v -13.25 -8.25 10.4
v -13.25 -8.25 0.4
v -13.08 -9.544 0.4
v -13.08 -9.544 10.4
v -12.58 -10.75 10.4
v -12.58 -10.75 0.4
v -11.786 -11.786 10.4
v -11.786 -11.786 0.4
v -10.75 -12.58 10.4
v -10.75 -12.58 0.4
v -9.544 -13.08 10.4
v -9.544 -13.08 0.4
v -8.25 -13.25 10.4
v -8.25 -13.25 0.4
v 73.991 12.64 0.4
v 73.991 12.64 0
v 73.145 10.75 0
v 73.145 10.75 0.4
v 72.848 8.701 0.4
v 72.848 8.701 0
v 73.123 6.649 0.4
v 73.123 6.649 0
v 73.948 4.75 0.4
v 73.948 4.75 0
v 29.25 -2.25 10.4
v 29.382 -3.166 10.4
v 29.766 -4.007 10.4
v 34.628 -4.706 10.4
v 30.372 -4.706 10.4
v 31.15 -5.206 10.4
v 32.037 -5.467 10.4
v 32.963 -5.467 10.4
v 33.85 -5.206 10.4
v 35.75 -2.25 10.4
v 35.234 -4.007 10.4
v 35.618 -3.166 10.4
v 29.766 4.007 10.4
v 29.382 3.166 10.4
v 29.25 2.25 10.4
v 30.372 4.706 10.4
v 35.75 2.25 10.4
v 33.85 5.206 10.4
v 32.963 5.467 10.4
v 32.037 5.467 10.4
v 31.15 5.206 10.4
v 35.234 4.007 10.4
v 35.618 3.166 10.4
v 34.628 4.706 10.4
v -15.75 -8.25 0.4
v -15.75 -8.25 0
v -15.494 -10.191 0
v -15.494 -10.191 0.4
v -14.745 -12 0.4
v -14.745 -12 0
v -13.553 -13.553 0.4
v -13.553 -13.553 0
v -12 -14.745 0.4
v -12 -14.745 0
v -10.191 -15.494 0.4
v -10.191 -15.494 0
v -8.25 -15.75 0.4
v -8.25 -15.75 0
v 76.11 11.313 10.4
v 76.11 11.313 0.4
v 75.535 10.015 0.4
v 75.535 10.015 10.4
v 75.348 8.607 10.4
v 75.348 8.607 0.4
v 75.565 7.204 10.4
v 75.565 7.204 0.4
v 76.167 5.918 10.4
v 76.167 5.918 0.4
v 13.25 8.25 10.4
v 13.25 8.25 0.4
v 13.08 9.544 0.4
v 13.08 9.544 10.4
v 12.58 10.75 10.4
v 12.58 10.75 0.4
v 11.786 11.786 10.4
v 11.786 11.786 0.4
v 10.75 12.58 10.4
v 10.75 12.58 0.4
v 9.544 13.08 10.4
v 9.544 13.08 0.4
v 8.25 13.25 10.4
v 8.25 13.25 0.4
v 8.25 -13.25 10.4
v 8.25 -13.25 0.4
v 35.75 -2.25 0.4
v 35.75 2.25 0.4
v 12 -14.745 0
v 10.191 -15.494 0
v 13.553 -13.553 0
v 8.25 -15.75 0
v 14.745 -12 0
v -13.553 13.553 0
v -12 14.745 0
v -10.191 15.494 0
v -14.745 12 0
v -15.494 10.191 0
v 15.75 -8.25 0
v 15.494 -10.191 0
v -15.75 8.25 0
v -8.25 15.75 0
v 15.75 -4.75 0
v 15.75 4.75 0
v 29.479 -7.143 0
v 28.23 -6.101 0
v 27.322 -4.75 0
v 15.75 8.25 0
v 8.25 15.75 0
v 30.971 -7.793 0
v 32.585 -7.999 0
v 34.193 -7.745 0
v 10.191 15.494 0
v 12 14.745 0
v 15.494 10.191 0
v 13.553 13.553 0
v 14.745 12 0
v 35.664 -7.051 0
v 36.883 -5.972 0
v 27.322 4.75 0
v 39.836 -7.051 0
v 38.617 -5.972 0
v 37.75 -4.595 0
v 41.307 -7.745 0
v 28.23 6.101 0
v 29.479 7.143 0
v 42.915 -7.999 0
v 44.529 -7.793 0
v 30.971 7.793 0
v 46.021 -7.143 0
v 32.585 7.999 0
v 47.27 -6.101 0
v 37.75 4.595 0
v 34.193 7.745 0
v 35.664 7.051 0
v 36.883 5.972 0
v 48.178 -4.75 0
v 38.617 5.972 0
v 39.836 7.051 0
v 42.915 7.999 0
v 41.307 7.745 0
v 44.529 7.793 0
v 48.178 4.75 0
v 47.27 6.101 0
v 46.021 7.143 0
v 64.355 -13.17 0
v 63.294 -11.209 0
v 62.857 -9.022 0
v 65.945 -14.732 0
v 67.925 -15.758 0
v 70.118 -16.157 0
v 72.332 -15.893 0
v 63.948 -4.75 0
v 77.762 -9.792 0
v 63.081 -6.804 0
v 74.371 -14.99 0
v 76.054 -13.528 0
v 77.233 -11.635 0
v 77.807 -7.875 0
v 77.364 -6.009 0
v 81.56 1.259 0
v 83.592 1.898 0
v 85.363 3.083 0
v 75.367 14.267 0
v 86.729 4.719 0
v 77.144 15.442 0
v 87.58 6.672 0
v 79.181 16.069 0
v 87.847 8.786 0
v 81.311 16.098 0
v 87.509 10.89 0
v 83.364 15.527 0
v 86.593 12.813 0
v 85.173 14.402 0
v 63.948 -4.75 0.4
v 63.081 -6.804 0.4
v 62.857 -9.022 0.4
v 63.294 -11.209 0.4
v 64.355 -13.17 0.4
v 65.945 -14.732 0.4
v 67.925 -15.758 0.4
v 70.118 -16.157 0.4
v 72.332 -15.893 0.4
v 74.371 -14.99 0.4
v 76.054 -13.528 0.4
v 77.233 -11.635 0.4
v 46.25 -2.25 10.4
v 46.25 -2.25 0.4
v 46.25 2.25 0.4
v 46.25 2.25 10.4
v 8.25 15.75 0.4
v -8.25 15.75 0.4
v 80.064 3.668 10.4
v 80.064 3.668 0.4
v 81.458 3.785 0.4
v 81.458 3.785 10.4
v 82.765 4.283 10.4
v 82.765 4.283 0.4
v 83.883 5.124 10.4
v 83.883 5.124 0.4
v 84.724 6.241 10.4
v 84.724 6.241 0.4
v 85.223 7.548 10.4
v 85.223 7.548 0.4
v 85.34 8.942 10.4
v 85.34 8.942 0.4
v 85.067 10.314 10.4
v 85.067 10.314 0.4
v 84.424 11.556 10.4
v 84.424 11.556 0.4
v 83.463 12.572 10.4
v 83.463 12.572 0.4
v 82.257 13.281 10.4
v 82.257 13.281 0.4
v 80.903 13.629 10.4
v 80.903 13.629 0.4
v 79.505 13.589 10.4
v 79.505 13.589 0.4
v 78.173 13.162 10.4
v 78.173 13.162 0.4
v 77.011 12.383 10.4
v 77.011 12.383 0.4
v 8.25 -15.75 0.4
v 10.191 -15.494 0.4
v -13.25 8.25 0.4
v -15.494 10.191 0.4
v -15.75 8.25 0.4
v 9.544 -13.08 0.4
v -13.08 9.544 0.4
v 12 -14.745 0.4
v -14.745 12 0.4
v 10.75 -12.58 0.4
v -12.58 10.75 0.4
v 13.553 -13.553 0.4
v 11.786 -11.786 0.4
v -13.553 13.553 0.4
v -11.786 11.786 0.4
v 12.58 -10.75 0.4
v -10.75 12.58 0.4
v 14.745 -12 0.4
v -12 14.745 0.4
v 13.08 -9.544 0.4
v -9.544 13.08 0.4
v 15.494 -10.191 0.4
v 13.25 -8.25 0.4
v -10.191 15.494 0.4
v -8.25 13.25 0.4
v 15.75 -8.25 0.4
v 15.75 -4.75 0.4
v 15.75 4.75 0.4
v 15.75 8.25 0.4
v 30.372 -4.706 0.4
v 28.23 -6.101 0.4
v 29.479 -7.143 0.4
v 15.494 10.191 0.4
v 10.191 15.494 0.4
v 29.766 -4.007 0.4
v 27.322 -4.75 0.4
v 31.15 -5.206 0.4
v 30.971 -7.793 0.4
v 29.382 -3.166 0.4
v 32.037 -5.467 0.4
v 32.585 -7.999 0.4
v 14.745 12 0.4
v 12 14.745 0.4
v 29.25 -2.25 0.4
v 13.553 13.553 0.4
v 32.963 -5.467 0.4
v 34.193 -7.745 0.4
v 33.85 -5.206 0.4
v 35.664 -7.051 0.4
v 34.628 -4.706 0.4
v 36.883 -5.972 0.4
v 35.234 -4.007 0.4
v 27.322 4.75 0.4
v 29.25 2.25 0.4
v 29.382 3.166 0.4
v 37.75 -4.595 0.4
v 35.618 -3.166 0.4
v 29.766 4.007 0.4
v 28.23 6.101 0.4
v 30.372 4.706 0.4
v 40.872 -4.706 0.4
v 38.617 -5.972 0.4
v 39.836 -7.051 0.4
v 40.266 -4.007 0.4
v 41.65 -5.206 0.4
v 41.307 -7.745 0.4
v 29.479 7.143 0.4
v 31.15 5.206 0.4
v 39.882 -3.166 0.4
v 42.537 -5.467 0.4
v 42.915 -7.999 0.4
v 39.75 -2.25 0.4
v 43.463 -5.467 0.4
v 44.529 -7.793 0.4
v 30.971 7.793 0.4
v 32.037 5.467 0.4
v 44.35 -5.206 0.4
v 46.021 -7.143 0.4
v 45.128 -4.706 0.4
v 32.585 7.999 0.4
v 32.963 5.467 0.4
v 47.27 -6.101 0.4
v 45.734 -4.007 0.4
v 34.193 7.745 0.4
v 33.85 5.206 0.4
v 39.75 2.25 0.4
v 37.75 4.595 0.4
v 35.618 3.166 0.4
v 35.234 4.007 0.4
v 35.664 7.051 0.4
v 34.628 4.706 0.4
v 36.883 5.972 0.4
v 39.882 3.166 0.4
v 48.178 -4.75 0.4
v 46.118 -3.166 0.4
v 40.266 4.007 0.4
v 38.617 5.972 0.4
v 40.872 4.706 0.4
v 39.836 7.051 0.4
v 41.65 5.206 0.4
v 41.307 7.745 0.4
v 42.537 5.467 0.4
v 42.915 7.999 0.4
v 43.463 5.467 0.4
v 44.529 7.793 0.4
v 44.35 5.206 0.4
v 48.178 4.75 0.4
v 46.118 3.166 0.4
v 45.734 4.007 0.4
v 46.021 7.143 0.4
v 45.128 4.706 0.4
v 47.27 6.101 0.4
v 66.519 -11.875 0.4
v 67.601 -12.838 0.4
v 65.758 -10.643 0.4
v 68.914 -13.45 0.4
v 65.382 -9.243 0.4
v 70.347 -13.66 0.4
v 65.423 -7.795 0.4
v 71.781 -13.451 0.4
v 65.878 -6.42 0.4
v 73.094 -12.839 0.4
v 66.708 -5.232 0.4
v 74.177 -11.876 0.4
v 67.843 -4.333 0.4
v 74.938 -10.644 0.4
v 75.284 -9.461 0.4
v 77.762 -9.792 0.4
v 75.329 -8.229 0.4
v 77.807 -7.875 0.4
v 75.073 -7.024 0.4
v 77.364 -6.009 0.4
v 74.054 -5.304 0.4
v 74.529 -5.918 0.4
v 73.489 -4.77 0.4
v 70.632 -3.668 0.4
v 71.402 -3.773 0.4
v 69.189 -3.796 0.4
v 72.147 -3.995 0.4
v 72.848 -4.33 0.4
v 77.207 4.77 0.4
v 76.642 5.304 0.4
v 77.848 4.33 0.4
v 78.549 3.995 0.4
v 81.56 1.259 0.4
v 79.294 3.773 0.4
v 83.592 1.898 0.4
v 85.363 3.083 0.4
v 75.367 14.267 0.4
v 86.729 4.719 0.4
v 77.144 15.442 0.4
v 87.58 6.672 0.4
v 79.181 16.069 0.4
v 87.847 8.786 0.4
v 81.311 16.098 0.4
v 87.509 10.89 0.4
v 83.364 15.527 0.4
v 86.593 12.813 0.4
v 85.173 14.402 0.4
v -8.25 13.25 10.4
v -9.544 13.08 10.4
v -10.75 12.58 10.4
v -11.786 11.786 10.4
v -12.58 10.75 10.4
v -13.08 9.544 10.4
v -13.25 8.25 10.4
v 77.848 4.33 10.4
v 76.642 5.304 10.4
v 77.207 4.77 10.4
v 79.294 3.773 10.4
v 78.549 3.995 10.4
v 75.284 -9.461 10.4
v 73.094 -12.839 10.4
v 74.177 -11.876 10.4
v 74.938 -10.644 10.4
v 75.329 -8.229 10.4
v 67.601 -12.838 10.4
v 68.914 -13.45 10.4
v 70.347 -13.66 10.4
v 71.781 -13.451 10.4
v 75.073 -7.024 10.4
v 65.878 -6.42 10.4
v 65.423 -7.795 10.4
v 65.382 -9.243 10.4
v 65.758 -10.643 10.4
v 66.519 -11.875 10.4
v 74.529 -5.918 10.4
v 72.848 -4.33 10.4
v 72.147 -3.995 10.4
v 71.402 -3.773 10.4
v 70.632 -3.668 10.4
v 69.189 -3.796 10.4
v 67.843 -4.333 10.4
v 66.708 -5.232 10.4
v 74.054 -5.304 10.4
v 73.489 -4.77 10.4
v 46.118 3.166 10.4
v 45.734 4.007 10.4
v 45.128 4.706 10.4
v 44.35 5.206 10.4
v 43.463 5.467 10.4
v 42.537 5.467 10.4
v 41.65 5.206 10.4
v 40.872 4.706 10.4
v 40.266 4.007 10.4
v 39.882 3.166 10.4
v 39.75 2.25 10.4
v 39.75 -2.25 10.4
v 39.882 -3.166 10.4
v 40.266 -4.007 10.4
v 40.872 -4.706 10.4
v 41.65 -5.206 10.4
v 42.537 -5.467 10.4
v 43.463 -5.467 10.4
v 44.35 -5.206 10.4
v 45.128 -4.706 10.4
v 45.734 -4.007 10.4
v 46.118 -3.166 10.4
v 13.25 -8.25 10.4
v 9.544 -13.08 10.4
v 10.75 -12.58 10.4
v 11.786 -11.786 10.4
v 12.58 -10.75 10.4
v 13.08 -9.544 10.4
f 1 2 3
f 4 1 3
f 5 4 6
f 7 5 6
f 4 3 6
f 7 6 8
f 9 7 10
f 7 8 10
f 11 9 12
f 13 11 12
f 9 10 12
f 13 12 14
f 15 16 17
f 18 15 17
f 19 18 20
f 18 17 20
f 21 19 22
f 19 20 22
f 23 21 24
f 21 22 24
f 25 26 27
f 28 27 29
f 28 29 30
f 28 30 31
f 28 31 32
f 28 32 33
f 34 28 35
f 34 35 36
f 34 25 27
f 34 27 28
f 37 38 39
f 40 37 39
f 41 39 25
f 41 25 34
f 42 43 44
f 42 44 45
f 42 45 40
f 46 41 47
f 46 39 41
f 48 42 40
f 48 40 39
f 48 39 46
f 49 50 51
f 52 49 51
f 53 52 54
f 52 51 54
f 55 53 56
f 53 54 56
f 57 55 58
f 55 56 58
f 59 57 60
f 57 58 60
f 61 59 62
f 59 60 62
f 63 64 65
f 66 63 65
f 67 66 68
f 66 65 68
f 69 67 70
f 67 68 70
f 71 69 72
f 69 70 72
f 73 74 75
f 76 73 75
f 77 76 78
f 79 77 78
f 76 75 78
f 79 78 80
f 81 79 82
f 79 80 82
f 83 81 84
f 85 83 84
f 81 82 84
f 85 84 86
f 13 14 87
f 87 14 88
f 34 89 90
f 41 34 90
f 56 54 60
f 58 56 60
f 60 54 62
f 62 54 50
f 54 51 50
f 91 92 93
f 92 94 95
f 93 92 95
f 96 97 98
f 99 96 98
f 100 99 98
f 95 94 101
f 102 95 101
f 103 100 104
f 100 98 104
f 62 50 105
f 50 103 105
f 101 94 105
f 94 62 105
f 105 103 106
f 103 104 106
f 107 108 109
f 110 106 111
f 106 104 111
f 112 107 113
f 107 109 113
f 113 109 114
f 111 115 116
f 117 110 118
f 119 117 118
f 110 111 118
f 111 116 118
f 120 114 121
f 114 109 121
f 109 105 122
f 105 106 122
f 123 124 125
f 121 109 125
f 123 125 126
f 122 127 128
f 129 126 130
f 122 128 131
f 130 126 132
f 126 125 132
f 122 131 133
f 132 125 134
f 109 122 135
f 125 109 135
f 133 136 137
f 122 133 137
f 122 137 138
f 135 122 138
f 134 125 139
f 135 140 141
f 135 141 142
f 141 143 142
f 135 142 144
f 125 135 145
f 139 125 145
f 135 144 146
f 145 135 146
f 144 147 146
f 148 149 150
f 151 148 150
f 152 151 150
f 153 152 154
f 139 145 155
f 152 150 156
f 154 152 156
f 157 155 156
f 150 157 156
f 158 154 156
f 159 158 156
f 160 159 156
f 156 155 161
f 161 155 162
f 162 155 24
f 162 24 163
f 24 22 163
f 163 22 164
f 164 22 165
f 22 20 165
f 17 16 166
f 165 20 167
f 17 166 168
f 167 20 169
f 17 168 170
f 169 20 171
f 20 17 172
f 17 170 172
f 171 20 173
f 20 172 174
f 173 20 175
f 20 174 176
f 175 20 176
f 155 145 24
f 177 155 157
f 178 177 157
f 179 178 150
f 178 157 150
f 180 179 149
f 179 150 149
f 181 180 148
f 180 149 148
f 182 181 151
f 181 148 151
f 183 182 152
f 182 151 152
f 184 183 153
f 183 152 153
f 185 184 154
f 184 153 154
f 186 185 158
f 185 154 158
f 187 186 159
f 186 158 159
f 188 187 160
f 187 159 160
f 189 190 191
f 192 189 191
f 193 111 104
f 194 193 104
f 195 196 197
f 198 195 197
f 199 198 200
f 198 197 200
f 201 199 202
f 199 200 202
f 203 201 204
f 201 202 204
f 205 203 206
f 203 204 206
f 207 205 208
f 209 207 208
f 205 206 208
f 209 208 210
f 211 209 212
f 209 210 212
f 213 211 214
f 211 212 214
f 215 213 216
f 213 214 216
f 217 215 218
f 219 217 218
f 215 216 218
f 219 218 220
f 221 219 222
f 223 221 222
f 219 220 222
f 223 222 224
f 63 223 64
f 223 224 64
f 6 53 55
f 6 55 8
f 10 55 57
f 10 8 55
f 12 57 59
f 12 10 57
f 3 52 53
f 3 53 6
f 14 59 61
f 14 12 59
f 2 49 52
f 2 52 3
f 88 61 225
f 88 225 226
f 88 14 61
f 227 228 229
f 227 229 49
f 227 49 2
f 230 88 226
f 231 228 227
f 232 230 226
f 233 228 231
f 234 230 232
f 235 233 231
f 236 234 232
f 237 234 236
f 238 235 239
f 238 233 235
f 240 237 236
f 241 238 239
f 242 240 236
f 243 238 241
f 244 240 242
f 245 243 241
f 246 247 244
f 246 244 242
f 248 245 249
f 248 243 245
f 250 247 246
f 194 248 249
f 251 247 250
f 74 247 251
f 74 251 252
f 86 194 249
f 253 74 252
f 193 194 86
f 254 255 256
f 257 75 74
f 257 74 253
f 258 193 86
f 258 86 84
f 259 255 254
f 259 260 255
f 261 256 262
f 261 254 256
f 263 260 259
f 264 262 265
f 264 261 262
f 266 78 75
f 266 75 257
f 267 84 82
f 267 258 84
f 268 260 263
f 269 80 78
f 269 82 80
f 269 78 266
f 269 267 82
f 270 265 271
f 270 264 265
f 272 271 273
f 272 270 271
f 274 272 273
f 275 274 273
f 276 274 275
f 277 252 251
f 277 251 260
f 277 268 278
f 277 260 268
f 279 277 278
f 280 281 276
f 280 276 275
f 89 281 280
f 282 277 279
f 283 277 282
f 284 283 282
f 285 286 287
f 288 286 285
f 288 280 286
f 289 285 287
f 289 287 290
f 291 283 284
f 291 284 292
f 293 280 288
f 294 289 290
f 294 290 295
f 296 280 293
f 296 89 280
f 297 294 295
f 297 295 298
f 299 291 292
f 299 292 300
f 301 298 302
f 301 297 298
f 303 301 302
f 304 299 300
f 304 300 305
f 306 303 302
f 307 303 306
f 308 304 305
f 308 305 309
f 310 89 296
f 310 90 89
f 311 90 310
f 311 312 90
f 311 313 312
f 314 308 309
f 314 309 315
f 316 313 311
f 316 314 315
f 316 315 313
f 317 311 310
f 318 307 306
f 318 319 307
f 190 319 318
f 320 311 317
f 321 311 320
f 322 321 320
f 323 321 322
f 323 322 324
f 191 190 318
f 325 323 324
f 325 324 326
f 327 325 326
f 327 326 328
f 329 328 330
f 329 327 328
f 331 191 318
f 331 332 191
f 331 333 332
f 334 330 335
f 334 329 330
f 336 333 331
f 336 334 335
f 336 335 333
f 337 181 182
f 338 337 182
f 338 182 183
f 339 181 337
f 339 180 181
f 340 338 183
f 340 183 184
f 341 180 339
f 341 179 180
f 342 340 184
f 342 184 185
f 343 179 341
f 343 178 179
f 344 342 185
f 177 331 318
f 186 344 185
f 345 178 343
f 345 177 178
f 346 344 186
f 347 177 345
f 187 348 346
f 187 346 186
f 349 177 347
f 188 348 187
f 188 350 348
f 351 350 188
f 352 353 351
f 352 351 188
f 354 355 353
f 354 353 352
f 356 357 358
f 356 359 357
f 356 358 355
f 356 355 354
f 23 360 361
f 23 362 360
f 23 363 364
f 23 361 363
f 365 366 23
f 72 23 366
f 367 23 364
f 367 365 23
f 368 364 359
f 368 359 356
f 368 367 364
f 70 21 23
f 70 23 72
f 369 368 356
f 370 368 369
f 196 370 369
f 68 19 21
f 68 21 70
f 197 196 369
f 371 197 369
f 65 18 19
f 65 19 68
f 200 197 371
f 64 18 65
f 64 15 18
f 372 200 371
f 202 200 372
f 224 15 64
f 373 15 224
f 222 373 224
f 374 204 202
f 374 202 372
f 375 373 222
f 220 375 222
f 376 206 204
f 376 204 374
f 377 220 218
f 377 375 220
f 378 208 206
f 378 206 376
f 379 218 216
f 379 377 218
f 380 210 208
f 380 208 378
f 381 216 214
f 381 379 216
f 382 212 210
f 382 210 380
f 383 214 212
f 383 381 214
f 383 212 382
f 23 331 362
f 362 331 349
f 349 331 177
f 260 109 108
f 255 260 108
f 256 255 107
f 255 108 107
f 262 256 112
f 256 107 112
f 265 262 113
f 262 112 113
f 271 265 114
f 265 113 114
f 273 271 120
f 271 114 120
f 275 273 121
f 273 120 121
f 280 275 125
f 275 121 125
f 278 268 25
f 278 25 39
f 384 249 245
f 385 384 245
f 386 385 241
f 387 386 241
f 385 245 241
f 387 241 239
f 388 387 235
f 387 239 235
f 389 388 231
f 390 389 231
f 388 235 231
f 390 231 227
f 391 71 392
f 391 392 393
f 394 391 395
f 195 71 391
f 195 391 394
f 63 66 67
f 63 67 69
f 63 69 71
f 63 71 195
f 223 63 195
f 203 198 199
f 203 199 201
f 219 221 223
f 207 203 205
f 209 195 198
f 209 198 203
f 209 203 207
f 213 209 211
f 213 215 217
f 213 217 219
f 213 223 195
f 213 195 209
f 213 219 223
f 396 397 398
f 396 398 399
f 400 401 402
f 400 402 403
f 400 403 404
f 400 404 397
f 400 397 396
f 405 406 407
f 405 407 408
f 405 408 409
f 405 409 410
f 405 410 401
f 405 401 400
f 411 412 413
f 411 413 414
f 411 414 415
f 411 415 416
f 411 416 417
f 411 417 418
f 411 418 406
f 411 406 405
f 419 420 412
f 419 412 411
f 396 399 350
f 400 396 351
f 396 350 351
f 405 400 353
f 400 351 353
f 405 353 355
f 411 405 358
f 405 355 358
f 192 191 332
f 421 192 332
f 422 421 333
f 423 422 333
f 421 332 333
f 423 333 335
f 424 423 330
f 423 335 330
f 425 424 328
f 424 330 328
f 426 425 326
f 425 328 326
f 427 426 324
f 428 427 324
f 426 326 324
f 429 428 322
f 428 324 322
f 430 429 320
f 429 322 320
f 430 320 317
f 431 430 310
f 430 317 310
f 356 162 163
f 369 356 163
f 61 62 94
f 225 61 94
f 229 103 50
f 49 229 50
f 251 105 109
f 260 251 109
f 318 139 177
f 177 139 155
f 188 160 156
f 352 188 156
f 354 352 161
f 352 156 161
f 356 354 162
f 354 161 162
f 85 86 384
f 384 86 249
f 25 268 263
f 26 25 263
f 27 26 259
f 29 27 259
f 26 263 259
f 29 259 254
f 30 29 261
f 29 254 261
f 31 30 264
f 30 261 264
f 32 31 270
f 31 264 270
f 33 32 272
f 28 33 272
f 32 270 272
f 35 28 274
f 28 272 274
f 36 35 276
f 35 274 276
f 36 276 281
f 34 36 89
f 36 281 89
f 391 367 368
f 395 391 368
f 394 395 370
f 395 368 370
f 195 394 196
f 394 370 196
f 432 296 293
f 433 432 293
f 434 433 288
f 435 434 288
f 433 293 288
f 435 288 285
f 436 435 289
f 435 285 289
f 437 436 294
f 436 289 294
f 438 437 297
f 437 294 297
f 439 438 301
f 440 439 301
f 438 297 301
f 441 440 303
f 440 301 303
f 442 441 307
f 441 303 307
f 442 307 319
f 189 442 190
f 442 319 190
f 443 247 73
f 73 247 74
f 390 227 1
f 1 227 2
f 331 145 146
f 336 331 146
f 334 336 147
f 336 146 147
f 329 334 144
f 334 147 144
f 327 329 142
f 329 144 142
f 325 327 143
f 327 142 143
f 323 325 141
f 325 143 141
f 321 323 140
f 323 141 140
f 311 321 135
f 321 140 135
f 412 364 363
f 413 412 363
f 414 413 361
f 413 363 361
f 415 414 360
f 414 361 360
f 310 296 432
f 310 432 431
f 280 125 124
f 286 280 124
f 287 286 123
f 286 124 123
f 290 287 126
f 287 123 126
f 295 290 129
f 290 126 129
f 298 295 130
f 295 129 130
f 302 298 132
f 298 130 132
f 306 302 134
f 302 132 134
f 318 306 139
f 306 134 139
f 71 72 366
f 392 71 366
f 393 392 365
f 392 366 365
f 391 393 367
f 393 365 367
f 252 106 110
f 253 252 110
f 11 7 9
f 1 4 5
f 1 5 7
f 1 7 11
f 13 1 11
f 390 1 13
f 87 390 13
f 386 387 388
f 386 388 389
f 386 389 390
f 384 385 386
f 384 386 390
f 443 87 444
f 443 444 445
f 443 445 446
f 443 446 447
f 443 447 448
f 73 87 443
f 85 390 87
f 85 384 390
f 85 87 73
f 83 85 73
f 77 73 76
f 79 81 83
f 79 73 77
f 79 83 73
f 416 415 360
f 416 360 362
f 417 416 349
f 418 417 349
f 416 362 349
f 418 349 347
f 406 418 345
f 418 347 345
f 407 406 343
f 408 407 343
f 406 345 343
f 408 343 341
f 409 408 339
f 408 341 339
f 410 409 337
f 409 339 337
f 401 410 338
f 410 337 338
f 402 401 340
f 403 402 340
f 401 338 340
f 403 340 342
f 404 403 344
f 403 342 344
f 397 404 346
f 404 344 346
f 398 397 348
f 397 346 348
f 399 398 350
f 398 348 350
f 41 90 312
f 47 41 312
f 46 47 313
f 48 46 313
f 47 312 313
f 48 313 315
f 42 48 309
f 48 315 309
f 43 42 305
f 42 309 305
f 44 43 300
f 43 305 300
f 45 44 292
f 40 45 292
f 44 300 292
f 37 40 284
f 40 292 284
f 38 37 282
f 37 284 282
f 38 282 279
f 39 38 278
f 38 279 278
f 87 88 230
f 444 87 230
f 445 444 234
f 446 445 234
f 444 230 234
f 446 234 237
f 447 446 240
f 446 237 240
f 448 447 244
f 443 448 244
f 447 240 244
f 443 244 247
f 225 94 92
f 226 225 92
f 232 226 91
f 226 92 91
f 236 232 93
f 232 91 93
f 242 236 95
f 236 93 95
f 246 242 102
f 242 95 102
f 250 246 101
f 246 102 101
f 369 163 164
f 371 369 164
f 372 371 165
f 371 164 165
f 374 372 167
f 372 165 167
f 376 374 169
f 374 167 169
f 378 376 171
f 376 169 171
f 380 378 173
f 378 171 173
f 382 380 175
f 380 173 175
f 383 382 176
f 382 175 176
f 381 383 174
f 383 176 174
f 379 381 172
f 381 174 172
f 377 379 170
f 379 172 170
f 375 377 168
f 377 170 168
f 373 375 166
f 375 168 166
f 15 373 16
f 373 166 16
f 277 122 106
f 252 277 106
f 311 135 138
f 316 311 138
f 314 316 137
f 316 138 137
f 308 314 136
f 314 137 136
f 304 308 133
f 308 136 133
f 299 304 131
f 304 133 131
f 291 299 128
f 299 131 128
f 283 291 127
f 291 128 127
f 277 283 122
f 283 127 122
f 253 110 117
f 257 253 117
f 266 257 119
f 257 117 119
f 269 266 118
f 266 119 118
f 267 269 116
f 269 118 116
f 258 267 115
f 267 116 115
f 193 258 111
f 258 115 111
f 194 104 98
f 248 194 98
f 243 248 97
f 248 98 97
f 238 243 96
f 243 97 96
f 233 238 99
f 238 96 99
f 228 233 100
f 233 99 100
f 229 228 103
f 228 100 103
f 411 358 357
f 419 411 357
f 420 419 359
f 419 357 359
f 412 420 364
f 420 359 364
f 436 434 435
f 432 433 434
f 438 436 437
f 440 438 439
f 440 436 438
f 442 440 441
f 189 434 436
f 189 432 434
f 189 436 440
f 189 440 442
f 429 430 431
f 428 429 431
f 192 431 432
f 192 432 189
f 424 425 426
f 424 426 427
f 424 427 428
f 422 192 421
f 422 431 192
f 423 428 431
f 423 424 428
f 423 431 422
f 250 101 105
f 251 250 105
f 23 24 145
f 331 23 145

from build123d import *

# Parameters (mm, degrees)
F0_W     = 16
F0_H     = 4.5
F0_W_2   = 6.5
F0_W_3   = 4
F1_DEPTH = 0.4
F2_W     = 6.5
F2_H     = 4.5
F3_DEPTH = 10


with BuildPart() as f1:
    # F0 (on Top) → F1 (new body)
    with BuildSketch(Plane.XY):
        with BuildLine():
            Line((15.75, 4.75), (15.75, 8.25))
            ThreePointArc((15.75, 8.25), (13.5533008589, 13.5533008589), (8.25, 15.75))
            Line((8.25, 15.75), (-8.25, 15.75))
            ThreePointArc((-8.25, 15.75), (-13.5533008589, 13.5533008589), (-15.75, 8.25))
            Line((-15.75, 8.25), (-15.75, -8.25))
            ThreePointArc((-15.75, -8.25), (-13.5533008589, -13.5533008589), (-8.25, -15.75))
            Line((-8.25, -15.75), (8.25, -15.75))
            ThreePointArc((8.25, -15.75), (13.5533008589, -13.5533008589), (15.75, -8.25))
            Line((15.75, -8.25), (15.75, -4.75))
            Line((15.75, -4.75), (27.3219212057, -4.75))
            ThreePointArc((27.3219212057, -4.75), (32.5853423404, -7.9993666334), (37.75, -4.5952078799))
            ThreePointArc((37.75, -4.5952078799), (42.9146576596, -7.9993666334), (48.1780787943, -4.75))
            Line((48.1780787943, -4.75), (63.9480829801, -4.75))
            ThreePointArc((63.9480829801, -4.75), (66.8968372515, -15.3190038936), (77.2327151222, -11.6354426145))
            ThreePointArc((77.2327151222, -11.6354426145), (77.8460434738, -8.8348591092), (77.3637435709, -6.0087617221))
            Line((77.3637435709, -6.0087617221), (81.5596501878, 1.2587617221))
            ThreePointArc((81.5596501878, 1.2587617221), (86.5931791372, 12.813408194), (73.9909516796, 12.6398228195))
            ThreePointArc((73.9909516796, 12.6398228195), (72.8481869165, 8.7010040658), (73.9480829801, 4.75))
            Line((73.9480829801, 4.75), (48.1780787943, 4.75))
            ThreePointArc((48.1780787943, 4.75), (42.9146576596, 7.9993666334), (37.75, 4.5952078799))
            ThreePointArc((37.75, 4.5952078799), (32.5853423404, 7.9993666334), (27.3219212057, 4.75))
            Line((27.3219212057, 4.75), (15.75, 4.75))
        make_face()
        with BuildLine():
            ThreePointArc((13.25, -8.25), (11.7855339059, -11.7855339059), (8.25, -13.25))
            Line((8.25, -13.25), (4.5, -13.25))
            Line((4.5, -13.25), (-4.5, -13.25))
            Line((-4.5, -13.25), (-8.25, -13.25))
            ThreePointArc((-8.25, -13.25), (-11.7855339059, -11.7855339059), (-13.25, -8.25))
            Line((-13.25, -8.25), (-13.25, -4.5))
            Line((-13.25, -4.5), (-13.25, 4.5))
            Line((-13.25, 4.5), (-13.25, 8.25))
            ThreePointArc((-13.25, 8.25), (-11.7855339059, 11.7855339059), (-8.25, 13.25))
            Line((-8.25, 13.25), (-4.5, 13.25))
            Line((-4.5, 13.25), (4.5, 13.25))
            Line((4.5, 13.25), (8.25, 13.25))
            ThreePointArc((8.25, 13.25), (11.7855339059, 11.7855339059), (13.25, 8.25))
            Line((13.25, 8.25), (13.25, 4.5))
            Line((13.25, 4.5), (13.25, 2.25))
            Line((13.25, 2.25), (29.25, 2.25))
            ThreePointArc((29.25, 2.25), (32.5, 5.5), (35.75, 2.25))
            Line((35.75, 2.25), (39.75, 2.25))
            ThreePointArc((39.75, 2.25), (43, 5.5), (46.25, 2.25))
            Line((46.25, 2.25), (74.0490381057, 2.25))
            Line((74.0490381057, 2.25), (76.1669476654, 5.9183269633))
            ThreePointArc((76.1669476654, 5.9183269633), (75.3483548112, 8.6074722144), (76.1099931902, 11.3132998923))
            ThreePointArc((76.1099931902, 11.3132998923), (84.7892183681, 10.9572643434), (80.0640619824, 3.6683269633))
            Line((80.0640619824, 3.6683269633), (74.5292047573, -5.9183269633))
            ThreePointArc((74.5292047573, -5.9183269633), (75.3294853289, -8.2294835611), (74.9378354853, -10.643713089))
            ThreePointArc((74.9378354853, -10.643713089), (66.0933823399, -11.2865784771), (70.6320904403, -3.6683269633))
            Line((70.6320904403, -3.6683269633), (71.4509618943, -2.25))
            Line((71.4509618943, -2.25), (46.25, -2.25))
            ThreePointArc((46.25, -2.25), (43, -5.5), (39.75, -2.25))
            Line((39.75, -2.25), (35.75, -2.25))
            ThreePointArc((35.75, -2.25), (32.5, -5.5), (29.25, -2.25))
            Line((29.25, -2.25), (13.25, -2.25))
            Line((13.25, -2.25), (13.25, -4.5))
            Line((13.25, -4.5), (13.25, -8.25))
        make_face(mode=Mode.SUBTRACT)
        Polygon((46.25, 2.25), (46.25, -2.25), (71.4509618943, -2.25), (74.0490381057, 2.25), align=None)
        Polygon((-4.5, 4.5), (0, 4.5), (4.5, 4.5), (4.5, 13.25), (-4.5, 13.25), align=None)
        Polygon((-13.25, -4.5), (-4.5, -4.5), (-4.5, 0), (-4.5, 4.5), (-13.25, 4.5), align=None)
        Polygon((4.5, 0), (4.5, -4.5), (13.25, -4.5), (13.25, -2.25), (13.25, 2.25), (13.25, 4.5), (4.5, 4.5), align=None)
        Polygon((-4.5, -13.25), (4.5, -13.25), (4.5, -4.5), (0, -4.5), (-4.5, -4.5), align=None)
        with BuildLine():
            ThreePointArc((74.5292047573, -5.9183269633), (72.8480762114, -4.3301270189), (70.6320904403, -3.6683269633))
            ThreePointArc((70.6320904403, -3.6683269633), (66.0933823399, -11.2865784771), (74.9378354853, -10.643713089))
            ThreePointArc((74.9378354853, -10.643713089), (75.3294853289, -8.2294835611), (74.5292047573, -5.9183269633))
        make_face()
        with BuildLine():
            ThreePointArc((76.1099931902, 11.3132998923), (75.3483548112, 8.6074722144), (76.1669476654, 5.9183269633))
            ThreePointArc((76.1669476654, 5.9183269633), (77.8480762114, 4.3301270189), (80.0640619824, 3.6683269633))
            ThreePointArc((80.0640619824, 3.6683269633), (84.7892183681, 10.9572643434), (76.1099931902, 11.3132998923))
        make_face()
        with Locations((21.25, 0)):
            Rectangle(F0_W, F0_H)
        with BuildLine():
            Line((4.5, 13.25), (4.5, 4.5))
            Line((4.5, 4.5), (13.25, 4.5))
            Line((13.25, 4.5), (13.25, 8.25))
            ThreePointArc((13.25, 8.25), (11.7855339059, 11.7855339059), (8.25, 13.25))
            Line((8.25, 13.25), (4.5, 13.25))
        make_face()
        with BuildLine():
            Line((-13.25, 4.5), (-4.5, 4.5))
            Line((-4.5, 4.5), (-4.5, 13.25))
            Line((-4.5, 13.25), (-8.25, 13.25))
            ThreePointArc((-8.25, 13.25), (-11.7855339059, 11.7855339059), (-13.25, 8.25))
            Line((-13.25, 8.25), (-13.25, 4.5))
        make_face()
        with BuildLine():
            Line((4.5, -13.25), (8.25, -13.25))
            ThreePointArc((8.25, -13.25), (11.7855339059, -11.7855339059), (13.25, -8.25))
            Line((13.25, -8.25), (13.25, -4.5))
            Line((13.25, -4.5), (4.5, -4.5))
            Line((4.5, -4.5), (4.5, -13.25))
        make_face()
        with BuildLine():
            Line((-8.25, -13.25), (-4.5, -13.25))
            Line((-4.5, -13.25), (-4.5, -4.5))
            Line((-4.5, -4.5), (-13.25, -4.5))
            Line((-13.25, -4.5), (-13.25, -8.25))
            ThreePointArc((-13.25, -8.25), (-11.7855339059, -11.7855339059), (-8.25, -13.25))
        make_face()
        with BuildLine():
            ThreePointArc((0, -4.5), (3.1819805153, -3.1819805153), (4.5, 0))
            ThreePointArc((4.5, 0), (3.1819805153, 3.1819805153), (0, 4.5))
            ThreePointArc((0, 4.5), (-3.1819805153, 3.1819805153), (-4.5, 0))
            ThreePointArc((-4.5, 0), (-3.1819805153, -3.1819805153), (0, -4.5))
        make_face()
        with BuildLine():
            Line((74.0490381057, 2.25), (71.4509618943, -2.25))
            Line((71.4509618943, -2.25), (70.6320904403, -3.6683269633))
            ThreePointArc((70.6320904403, -3.6683269633), (72.8480762114, -4.3301270189), (74.5292047573, -5.9183269633))
            Line((74.5292047573, -5.9183269633), (80.0640619824, 3.6683269633))
            ThreePointArc((80.0640619824, 3.6683269633), (77.8480762114, 4.3301270189), (76.1669476654, 5.9183269633))
            Line((76.1669476654, 5.9183269633), (74.0490381057, 2.25))
        make_face()
        with Locations((32.5, 0)):
            Rectangle(F0_W_2, F0_H)
        with Locations((43, 0)):
            Rectangle(F0_W_2, F0_H)
        with Locations((37.75, 0)):
            Rectangle(F0_W_3, F0_H)
        with BuildLine():
            Line((35.75, -2.25), (29.25, -2.25))
            ThreePointArc((29.25, -2.25), (32.5, -5.5), (35.75, -2.25))
        make_face()
        with BuildLine():
            ThreePointArc((35.75, 2.25), (32.5, 5.5), (29.25, 2.25))
            Line((29.25, 2.25), (35.75, 2.25))
        make_face()
        with BuildLine():
            Line((46.25, -2.25), (39.75, -2.25))
            ThreePointArc((39.75, -2.25), (43, -5.5), (46.25, -2.25))
        make_face()
        with BuildLine():
            ThreePointArc((46.25, 2.25), (43, 5.5), (39.75, 2.25))
            Line((39.75, 2.25), (46.25, 2.25))
        make_face()
        with BuildLine():
            Line((0, -4.5), (4.5, -4.5))
            Line((4.5, -4.5), (4.5, 0))
            ThreePointArc((4.5, 0), (3.1819805153, -3.1819805153), (0, -4.5))
        make_face()
        with BuildLine():
            Line((-4.5, 4.5), (-4.5, 0))
            ThreePointArc((-4.5, 0), (-3.1819805153, 3.1819805153), (0, 4.5))
            Line((0, 4.5), (-4.5, 4.5))
        make_face()
        with BuildLine():
            Line((-4.5, 0), (-4.5, -4.5))
            Line((-4.5, -4.5), (0, -4.5))
            ThreePointArc((0, -4.5), (-3.1819805153, -3.1819805153), (-4.5, 0))
        make_face()
        with BuildLine():
            ThreePointArc((0, 4.5), (3.1819805153, 3.1819805153), (4.5, 0))
            Line((4.5, 0), (4.5, 4.5))
            Line((4.5, 4.5), (0, 4.5))
        make_face()
    extrude(amount=F1_DEPTH)

    # F2 (on face) → F3 (join)
    with BuildSketch(Plane.XY.offset(0.4)):
        Polygon((-4.5, -13.25), (4.5, -13.25), (4.5, -4.5), (0, -4.5), (-4.5, -4.5), align=None)
        with BuildLine():
            Line((35.75, -2.25), (29.25, -2.25))
            ThreePointArc((29.25, -2.25), (32.5, -5.5), (35.75, -2.25))
        make_face()
        with BuildLine():
            ThreePointArc((35.75, 2.25), (32.5, 5.5), (29.25, 2.25))
            Line((29.25, 2.25), (35.75, 2.25))
        make_face()
        with Locations((32.5, 0)):
            Rectangle(F2_W, F2_H)
        with BuildLine():
            ThreePointArc((46.25, 2.25), (43, 5.5), (39.75, 2.25))
            Line((39.75, 2.25), (46.25, 2.25))
        make_face()
        with Locations((43, 0)):
            Rectangle(F2_W, F2_H)
        with BuildLine():
            Line((46.25, -2.25), (39.75, -2.25))
            ThreePointArc((39.75, -2.25), (43, -5.5), (46.25, -2.25))
        make_face()
        with BuildLine():
            ThreePointArc((72.8480762114, -4.3301270189), (71.7788727151, -3.8693437522), (70.6320904403, -3.6683269633))
            ThreePointArc((70.6320904403, -3.6683269633), (66.0933823399, -11.2865784771), (74.9378354853, -10.643713089))
            ThreePointArc((74.9378354853, -10.643713089), (75.3294853289, -8.2294835611), (74.5292047573, -5.9183269633))
            ThreePointArc((74.5292047573, -5.9183269633), (73.7817279741, -5.0256927751), (72.8480762114, -4.3301270189))
        make_face()
        with BuildLine():
            ThreePointArc((76.1099931902, 11.3132998923), (75.3483548112, 8.6074722144), (76.1669476654, 5.9183269633))
            ThreePointArc((76.1669476654, 5.9183269633), (76.9144244486, 5.0256927751), (77.8480762114, 4.3301270189))
            ThreePointArc((77.8480762114, 4.3301270189), (78.9172797076, 3.8693437522), (80.0640619824, 3.6683269633))
            ThreePointArc((80.0640619824, 3.6683269633), (84.7892183681, 10.9572643434), (76.1099931902, 11.3132998923))
        make_face()
        Polygon((-13.25, -4.5), (-4.5, -4.5), (-4.5, 0), (-4.5, 4.5), (-13.25, 4.5), align=None)
        Polygon((4.5, 0), (4.5, -4.5), (13.25, -4.5), (13.25, -2.25), (13.25, 2.25), (13.25, 4.5), (4.5, 4.5), align=None)
        Polygon((-4.5, 4.5), (0, 4.5), (4.5, 4.5), (4.5, 13.25), (-4.5, 13.25), align=None)
        with BuildLine():
            Line((4.5, -13.25), (8.25, -13.25))
            ThreePointArc((8.25, -13.25), (11.7855339059, -11.7855339059), (13.25, -8.25))
            Line((13.25, -8.25), (13.25, -4.5))
            Line((13.25, -4.5), (4.5, -4.5))
            Line((4.5, -4.5), (4.5, -13.25))
        make_face()
        with BuildLine():
            Line((4.5, 13.25), (4.5, 4.5))
            Line((4.5, 4.5), (13.25, 4.5))
            Line((13.25, 4.5), (13.25, 8.25))
            ThreePointArc((13.25, 8.25), (11.7855339059, 11.7855339059), (8.25, 13.25))
            Line((8.25, 13.25), (4.5, 13.25))
        make_face()
        with BuildLine():
            Line((-13.25, 4.5), (-4.5, 4.5))
            Line((-4.5, 4.5), (-4.5, 13.25))
            Line((-4.5, 13.25), (-8.25, 13.25))
            ThreePointArc((-8.25, 13.25), (-11.7855339059, 11.7855339059), (-13.25, 8.25))
            Line((-13.25, 8.25), (-13.25, 4.5))
        make_face()
        with BuildLine():
            Line((-8.25, -13.25), (-4.5, -13.25))
            Line((-4.5, -13.25), (-4.5, -4.5))
            Line((-4.5, -4.5), (-13.25, -4.5))
            Line((-13.25, -4.5), (-13.25, -8.25))
            ThreePointArc((-13.25, -8.25), (-11.7855339059, -11.7855339059), (-8.25, -13.25))
        make_face()
        with BuildLine():
            ThreePointArc((0, -4.5), (3.1819805153, -3.1819805153), (4.5, 0))
            ThreePointArc((4.5, 0), (3.1819805153, 3.1819805153), (0, 4.5))
            ThreePointArc((0, 4.5), (-3.1819805153, 3.1819805153), (-4.5, 0))
            ThreePointArc((-4.5, 0), (-3.1819805153, -3.1819805153), (0, -4.5))
        make_face()
        with BuildLine():
            Line((0, -4.5), (4.5, -4.5))
            Line((4.5, -4.5), (4.5, 0))
            ThreePointArc((4.5, 0), (3.1819805153, -3.1819805153), (0, -4.5))
        make_face()
        with BuildLine():
            ThreePointArc((0, 4.5), (3.1819805153, 3.1819805153), (4.5, 0))
            Line((4.5, 0), (4.5, 4.5))
            Line((4.5, 4.5), (0, 4.5))
        make_face()
        with BuildLine():
            Line((-4.5, 4.5), (-4.5, 0))
            ThreePointArc((-4.5, 0), (-3.1819805153, 3.1819805153), (0, 4.5))
            Line((0, 4.5), (-4.5, 4.5))
        make_face()
        with BuildLine():
            Line((-4.5, 0), (-4.5, -4.5))
            Line((-4.5, -4.5), (0, -4.5))
            ThreePointArc((0, -4.5), (-3.1819805153, -3.1819805153), (-4.5, 0))
        make_face()
    extrude(amount=F3_DEPTH)


solid = f1.part
